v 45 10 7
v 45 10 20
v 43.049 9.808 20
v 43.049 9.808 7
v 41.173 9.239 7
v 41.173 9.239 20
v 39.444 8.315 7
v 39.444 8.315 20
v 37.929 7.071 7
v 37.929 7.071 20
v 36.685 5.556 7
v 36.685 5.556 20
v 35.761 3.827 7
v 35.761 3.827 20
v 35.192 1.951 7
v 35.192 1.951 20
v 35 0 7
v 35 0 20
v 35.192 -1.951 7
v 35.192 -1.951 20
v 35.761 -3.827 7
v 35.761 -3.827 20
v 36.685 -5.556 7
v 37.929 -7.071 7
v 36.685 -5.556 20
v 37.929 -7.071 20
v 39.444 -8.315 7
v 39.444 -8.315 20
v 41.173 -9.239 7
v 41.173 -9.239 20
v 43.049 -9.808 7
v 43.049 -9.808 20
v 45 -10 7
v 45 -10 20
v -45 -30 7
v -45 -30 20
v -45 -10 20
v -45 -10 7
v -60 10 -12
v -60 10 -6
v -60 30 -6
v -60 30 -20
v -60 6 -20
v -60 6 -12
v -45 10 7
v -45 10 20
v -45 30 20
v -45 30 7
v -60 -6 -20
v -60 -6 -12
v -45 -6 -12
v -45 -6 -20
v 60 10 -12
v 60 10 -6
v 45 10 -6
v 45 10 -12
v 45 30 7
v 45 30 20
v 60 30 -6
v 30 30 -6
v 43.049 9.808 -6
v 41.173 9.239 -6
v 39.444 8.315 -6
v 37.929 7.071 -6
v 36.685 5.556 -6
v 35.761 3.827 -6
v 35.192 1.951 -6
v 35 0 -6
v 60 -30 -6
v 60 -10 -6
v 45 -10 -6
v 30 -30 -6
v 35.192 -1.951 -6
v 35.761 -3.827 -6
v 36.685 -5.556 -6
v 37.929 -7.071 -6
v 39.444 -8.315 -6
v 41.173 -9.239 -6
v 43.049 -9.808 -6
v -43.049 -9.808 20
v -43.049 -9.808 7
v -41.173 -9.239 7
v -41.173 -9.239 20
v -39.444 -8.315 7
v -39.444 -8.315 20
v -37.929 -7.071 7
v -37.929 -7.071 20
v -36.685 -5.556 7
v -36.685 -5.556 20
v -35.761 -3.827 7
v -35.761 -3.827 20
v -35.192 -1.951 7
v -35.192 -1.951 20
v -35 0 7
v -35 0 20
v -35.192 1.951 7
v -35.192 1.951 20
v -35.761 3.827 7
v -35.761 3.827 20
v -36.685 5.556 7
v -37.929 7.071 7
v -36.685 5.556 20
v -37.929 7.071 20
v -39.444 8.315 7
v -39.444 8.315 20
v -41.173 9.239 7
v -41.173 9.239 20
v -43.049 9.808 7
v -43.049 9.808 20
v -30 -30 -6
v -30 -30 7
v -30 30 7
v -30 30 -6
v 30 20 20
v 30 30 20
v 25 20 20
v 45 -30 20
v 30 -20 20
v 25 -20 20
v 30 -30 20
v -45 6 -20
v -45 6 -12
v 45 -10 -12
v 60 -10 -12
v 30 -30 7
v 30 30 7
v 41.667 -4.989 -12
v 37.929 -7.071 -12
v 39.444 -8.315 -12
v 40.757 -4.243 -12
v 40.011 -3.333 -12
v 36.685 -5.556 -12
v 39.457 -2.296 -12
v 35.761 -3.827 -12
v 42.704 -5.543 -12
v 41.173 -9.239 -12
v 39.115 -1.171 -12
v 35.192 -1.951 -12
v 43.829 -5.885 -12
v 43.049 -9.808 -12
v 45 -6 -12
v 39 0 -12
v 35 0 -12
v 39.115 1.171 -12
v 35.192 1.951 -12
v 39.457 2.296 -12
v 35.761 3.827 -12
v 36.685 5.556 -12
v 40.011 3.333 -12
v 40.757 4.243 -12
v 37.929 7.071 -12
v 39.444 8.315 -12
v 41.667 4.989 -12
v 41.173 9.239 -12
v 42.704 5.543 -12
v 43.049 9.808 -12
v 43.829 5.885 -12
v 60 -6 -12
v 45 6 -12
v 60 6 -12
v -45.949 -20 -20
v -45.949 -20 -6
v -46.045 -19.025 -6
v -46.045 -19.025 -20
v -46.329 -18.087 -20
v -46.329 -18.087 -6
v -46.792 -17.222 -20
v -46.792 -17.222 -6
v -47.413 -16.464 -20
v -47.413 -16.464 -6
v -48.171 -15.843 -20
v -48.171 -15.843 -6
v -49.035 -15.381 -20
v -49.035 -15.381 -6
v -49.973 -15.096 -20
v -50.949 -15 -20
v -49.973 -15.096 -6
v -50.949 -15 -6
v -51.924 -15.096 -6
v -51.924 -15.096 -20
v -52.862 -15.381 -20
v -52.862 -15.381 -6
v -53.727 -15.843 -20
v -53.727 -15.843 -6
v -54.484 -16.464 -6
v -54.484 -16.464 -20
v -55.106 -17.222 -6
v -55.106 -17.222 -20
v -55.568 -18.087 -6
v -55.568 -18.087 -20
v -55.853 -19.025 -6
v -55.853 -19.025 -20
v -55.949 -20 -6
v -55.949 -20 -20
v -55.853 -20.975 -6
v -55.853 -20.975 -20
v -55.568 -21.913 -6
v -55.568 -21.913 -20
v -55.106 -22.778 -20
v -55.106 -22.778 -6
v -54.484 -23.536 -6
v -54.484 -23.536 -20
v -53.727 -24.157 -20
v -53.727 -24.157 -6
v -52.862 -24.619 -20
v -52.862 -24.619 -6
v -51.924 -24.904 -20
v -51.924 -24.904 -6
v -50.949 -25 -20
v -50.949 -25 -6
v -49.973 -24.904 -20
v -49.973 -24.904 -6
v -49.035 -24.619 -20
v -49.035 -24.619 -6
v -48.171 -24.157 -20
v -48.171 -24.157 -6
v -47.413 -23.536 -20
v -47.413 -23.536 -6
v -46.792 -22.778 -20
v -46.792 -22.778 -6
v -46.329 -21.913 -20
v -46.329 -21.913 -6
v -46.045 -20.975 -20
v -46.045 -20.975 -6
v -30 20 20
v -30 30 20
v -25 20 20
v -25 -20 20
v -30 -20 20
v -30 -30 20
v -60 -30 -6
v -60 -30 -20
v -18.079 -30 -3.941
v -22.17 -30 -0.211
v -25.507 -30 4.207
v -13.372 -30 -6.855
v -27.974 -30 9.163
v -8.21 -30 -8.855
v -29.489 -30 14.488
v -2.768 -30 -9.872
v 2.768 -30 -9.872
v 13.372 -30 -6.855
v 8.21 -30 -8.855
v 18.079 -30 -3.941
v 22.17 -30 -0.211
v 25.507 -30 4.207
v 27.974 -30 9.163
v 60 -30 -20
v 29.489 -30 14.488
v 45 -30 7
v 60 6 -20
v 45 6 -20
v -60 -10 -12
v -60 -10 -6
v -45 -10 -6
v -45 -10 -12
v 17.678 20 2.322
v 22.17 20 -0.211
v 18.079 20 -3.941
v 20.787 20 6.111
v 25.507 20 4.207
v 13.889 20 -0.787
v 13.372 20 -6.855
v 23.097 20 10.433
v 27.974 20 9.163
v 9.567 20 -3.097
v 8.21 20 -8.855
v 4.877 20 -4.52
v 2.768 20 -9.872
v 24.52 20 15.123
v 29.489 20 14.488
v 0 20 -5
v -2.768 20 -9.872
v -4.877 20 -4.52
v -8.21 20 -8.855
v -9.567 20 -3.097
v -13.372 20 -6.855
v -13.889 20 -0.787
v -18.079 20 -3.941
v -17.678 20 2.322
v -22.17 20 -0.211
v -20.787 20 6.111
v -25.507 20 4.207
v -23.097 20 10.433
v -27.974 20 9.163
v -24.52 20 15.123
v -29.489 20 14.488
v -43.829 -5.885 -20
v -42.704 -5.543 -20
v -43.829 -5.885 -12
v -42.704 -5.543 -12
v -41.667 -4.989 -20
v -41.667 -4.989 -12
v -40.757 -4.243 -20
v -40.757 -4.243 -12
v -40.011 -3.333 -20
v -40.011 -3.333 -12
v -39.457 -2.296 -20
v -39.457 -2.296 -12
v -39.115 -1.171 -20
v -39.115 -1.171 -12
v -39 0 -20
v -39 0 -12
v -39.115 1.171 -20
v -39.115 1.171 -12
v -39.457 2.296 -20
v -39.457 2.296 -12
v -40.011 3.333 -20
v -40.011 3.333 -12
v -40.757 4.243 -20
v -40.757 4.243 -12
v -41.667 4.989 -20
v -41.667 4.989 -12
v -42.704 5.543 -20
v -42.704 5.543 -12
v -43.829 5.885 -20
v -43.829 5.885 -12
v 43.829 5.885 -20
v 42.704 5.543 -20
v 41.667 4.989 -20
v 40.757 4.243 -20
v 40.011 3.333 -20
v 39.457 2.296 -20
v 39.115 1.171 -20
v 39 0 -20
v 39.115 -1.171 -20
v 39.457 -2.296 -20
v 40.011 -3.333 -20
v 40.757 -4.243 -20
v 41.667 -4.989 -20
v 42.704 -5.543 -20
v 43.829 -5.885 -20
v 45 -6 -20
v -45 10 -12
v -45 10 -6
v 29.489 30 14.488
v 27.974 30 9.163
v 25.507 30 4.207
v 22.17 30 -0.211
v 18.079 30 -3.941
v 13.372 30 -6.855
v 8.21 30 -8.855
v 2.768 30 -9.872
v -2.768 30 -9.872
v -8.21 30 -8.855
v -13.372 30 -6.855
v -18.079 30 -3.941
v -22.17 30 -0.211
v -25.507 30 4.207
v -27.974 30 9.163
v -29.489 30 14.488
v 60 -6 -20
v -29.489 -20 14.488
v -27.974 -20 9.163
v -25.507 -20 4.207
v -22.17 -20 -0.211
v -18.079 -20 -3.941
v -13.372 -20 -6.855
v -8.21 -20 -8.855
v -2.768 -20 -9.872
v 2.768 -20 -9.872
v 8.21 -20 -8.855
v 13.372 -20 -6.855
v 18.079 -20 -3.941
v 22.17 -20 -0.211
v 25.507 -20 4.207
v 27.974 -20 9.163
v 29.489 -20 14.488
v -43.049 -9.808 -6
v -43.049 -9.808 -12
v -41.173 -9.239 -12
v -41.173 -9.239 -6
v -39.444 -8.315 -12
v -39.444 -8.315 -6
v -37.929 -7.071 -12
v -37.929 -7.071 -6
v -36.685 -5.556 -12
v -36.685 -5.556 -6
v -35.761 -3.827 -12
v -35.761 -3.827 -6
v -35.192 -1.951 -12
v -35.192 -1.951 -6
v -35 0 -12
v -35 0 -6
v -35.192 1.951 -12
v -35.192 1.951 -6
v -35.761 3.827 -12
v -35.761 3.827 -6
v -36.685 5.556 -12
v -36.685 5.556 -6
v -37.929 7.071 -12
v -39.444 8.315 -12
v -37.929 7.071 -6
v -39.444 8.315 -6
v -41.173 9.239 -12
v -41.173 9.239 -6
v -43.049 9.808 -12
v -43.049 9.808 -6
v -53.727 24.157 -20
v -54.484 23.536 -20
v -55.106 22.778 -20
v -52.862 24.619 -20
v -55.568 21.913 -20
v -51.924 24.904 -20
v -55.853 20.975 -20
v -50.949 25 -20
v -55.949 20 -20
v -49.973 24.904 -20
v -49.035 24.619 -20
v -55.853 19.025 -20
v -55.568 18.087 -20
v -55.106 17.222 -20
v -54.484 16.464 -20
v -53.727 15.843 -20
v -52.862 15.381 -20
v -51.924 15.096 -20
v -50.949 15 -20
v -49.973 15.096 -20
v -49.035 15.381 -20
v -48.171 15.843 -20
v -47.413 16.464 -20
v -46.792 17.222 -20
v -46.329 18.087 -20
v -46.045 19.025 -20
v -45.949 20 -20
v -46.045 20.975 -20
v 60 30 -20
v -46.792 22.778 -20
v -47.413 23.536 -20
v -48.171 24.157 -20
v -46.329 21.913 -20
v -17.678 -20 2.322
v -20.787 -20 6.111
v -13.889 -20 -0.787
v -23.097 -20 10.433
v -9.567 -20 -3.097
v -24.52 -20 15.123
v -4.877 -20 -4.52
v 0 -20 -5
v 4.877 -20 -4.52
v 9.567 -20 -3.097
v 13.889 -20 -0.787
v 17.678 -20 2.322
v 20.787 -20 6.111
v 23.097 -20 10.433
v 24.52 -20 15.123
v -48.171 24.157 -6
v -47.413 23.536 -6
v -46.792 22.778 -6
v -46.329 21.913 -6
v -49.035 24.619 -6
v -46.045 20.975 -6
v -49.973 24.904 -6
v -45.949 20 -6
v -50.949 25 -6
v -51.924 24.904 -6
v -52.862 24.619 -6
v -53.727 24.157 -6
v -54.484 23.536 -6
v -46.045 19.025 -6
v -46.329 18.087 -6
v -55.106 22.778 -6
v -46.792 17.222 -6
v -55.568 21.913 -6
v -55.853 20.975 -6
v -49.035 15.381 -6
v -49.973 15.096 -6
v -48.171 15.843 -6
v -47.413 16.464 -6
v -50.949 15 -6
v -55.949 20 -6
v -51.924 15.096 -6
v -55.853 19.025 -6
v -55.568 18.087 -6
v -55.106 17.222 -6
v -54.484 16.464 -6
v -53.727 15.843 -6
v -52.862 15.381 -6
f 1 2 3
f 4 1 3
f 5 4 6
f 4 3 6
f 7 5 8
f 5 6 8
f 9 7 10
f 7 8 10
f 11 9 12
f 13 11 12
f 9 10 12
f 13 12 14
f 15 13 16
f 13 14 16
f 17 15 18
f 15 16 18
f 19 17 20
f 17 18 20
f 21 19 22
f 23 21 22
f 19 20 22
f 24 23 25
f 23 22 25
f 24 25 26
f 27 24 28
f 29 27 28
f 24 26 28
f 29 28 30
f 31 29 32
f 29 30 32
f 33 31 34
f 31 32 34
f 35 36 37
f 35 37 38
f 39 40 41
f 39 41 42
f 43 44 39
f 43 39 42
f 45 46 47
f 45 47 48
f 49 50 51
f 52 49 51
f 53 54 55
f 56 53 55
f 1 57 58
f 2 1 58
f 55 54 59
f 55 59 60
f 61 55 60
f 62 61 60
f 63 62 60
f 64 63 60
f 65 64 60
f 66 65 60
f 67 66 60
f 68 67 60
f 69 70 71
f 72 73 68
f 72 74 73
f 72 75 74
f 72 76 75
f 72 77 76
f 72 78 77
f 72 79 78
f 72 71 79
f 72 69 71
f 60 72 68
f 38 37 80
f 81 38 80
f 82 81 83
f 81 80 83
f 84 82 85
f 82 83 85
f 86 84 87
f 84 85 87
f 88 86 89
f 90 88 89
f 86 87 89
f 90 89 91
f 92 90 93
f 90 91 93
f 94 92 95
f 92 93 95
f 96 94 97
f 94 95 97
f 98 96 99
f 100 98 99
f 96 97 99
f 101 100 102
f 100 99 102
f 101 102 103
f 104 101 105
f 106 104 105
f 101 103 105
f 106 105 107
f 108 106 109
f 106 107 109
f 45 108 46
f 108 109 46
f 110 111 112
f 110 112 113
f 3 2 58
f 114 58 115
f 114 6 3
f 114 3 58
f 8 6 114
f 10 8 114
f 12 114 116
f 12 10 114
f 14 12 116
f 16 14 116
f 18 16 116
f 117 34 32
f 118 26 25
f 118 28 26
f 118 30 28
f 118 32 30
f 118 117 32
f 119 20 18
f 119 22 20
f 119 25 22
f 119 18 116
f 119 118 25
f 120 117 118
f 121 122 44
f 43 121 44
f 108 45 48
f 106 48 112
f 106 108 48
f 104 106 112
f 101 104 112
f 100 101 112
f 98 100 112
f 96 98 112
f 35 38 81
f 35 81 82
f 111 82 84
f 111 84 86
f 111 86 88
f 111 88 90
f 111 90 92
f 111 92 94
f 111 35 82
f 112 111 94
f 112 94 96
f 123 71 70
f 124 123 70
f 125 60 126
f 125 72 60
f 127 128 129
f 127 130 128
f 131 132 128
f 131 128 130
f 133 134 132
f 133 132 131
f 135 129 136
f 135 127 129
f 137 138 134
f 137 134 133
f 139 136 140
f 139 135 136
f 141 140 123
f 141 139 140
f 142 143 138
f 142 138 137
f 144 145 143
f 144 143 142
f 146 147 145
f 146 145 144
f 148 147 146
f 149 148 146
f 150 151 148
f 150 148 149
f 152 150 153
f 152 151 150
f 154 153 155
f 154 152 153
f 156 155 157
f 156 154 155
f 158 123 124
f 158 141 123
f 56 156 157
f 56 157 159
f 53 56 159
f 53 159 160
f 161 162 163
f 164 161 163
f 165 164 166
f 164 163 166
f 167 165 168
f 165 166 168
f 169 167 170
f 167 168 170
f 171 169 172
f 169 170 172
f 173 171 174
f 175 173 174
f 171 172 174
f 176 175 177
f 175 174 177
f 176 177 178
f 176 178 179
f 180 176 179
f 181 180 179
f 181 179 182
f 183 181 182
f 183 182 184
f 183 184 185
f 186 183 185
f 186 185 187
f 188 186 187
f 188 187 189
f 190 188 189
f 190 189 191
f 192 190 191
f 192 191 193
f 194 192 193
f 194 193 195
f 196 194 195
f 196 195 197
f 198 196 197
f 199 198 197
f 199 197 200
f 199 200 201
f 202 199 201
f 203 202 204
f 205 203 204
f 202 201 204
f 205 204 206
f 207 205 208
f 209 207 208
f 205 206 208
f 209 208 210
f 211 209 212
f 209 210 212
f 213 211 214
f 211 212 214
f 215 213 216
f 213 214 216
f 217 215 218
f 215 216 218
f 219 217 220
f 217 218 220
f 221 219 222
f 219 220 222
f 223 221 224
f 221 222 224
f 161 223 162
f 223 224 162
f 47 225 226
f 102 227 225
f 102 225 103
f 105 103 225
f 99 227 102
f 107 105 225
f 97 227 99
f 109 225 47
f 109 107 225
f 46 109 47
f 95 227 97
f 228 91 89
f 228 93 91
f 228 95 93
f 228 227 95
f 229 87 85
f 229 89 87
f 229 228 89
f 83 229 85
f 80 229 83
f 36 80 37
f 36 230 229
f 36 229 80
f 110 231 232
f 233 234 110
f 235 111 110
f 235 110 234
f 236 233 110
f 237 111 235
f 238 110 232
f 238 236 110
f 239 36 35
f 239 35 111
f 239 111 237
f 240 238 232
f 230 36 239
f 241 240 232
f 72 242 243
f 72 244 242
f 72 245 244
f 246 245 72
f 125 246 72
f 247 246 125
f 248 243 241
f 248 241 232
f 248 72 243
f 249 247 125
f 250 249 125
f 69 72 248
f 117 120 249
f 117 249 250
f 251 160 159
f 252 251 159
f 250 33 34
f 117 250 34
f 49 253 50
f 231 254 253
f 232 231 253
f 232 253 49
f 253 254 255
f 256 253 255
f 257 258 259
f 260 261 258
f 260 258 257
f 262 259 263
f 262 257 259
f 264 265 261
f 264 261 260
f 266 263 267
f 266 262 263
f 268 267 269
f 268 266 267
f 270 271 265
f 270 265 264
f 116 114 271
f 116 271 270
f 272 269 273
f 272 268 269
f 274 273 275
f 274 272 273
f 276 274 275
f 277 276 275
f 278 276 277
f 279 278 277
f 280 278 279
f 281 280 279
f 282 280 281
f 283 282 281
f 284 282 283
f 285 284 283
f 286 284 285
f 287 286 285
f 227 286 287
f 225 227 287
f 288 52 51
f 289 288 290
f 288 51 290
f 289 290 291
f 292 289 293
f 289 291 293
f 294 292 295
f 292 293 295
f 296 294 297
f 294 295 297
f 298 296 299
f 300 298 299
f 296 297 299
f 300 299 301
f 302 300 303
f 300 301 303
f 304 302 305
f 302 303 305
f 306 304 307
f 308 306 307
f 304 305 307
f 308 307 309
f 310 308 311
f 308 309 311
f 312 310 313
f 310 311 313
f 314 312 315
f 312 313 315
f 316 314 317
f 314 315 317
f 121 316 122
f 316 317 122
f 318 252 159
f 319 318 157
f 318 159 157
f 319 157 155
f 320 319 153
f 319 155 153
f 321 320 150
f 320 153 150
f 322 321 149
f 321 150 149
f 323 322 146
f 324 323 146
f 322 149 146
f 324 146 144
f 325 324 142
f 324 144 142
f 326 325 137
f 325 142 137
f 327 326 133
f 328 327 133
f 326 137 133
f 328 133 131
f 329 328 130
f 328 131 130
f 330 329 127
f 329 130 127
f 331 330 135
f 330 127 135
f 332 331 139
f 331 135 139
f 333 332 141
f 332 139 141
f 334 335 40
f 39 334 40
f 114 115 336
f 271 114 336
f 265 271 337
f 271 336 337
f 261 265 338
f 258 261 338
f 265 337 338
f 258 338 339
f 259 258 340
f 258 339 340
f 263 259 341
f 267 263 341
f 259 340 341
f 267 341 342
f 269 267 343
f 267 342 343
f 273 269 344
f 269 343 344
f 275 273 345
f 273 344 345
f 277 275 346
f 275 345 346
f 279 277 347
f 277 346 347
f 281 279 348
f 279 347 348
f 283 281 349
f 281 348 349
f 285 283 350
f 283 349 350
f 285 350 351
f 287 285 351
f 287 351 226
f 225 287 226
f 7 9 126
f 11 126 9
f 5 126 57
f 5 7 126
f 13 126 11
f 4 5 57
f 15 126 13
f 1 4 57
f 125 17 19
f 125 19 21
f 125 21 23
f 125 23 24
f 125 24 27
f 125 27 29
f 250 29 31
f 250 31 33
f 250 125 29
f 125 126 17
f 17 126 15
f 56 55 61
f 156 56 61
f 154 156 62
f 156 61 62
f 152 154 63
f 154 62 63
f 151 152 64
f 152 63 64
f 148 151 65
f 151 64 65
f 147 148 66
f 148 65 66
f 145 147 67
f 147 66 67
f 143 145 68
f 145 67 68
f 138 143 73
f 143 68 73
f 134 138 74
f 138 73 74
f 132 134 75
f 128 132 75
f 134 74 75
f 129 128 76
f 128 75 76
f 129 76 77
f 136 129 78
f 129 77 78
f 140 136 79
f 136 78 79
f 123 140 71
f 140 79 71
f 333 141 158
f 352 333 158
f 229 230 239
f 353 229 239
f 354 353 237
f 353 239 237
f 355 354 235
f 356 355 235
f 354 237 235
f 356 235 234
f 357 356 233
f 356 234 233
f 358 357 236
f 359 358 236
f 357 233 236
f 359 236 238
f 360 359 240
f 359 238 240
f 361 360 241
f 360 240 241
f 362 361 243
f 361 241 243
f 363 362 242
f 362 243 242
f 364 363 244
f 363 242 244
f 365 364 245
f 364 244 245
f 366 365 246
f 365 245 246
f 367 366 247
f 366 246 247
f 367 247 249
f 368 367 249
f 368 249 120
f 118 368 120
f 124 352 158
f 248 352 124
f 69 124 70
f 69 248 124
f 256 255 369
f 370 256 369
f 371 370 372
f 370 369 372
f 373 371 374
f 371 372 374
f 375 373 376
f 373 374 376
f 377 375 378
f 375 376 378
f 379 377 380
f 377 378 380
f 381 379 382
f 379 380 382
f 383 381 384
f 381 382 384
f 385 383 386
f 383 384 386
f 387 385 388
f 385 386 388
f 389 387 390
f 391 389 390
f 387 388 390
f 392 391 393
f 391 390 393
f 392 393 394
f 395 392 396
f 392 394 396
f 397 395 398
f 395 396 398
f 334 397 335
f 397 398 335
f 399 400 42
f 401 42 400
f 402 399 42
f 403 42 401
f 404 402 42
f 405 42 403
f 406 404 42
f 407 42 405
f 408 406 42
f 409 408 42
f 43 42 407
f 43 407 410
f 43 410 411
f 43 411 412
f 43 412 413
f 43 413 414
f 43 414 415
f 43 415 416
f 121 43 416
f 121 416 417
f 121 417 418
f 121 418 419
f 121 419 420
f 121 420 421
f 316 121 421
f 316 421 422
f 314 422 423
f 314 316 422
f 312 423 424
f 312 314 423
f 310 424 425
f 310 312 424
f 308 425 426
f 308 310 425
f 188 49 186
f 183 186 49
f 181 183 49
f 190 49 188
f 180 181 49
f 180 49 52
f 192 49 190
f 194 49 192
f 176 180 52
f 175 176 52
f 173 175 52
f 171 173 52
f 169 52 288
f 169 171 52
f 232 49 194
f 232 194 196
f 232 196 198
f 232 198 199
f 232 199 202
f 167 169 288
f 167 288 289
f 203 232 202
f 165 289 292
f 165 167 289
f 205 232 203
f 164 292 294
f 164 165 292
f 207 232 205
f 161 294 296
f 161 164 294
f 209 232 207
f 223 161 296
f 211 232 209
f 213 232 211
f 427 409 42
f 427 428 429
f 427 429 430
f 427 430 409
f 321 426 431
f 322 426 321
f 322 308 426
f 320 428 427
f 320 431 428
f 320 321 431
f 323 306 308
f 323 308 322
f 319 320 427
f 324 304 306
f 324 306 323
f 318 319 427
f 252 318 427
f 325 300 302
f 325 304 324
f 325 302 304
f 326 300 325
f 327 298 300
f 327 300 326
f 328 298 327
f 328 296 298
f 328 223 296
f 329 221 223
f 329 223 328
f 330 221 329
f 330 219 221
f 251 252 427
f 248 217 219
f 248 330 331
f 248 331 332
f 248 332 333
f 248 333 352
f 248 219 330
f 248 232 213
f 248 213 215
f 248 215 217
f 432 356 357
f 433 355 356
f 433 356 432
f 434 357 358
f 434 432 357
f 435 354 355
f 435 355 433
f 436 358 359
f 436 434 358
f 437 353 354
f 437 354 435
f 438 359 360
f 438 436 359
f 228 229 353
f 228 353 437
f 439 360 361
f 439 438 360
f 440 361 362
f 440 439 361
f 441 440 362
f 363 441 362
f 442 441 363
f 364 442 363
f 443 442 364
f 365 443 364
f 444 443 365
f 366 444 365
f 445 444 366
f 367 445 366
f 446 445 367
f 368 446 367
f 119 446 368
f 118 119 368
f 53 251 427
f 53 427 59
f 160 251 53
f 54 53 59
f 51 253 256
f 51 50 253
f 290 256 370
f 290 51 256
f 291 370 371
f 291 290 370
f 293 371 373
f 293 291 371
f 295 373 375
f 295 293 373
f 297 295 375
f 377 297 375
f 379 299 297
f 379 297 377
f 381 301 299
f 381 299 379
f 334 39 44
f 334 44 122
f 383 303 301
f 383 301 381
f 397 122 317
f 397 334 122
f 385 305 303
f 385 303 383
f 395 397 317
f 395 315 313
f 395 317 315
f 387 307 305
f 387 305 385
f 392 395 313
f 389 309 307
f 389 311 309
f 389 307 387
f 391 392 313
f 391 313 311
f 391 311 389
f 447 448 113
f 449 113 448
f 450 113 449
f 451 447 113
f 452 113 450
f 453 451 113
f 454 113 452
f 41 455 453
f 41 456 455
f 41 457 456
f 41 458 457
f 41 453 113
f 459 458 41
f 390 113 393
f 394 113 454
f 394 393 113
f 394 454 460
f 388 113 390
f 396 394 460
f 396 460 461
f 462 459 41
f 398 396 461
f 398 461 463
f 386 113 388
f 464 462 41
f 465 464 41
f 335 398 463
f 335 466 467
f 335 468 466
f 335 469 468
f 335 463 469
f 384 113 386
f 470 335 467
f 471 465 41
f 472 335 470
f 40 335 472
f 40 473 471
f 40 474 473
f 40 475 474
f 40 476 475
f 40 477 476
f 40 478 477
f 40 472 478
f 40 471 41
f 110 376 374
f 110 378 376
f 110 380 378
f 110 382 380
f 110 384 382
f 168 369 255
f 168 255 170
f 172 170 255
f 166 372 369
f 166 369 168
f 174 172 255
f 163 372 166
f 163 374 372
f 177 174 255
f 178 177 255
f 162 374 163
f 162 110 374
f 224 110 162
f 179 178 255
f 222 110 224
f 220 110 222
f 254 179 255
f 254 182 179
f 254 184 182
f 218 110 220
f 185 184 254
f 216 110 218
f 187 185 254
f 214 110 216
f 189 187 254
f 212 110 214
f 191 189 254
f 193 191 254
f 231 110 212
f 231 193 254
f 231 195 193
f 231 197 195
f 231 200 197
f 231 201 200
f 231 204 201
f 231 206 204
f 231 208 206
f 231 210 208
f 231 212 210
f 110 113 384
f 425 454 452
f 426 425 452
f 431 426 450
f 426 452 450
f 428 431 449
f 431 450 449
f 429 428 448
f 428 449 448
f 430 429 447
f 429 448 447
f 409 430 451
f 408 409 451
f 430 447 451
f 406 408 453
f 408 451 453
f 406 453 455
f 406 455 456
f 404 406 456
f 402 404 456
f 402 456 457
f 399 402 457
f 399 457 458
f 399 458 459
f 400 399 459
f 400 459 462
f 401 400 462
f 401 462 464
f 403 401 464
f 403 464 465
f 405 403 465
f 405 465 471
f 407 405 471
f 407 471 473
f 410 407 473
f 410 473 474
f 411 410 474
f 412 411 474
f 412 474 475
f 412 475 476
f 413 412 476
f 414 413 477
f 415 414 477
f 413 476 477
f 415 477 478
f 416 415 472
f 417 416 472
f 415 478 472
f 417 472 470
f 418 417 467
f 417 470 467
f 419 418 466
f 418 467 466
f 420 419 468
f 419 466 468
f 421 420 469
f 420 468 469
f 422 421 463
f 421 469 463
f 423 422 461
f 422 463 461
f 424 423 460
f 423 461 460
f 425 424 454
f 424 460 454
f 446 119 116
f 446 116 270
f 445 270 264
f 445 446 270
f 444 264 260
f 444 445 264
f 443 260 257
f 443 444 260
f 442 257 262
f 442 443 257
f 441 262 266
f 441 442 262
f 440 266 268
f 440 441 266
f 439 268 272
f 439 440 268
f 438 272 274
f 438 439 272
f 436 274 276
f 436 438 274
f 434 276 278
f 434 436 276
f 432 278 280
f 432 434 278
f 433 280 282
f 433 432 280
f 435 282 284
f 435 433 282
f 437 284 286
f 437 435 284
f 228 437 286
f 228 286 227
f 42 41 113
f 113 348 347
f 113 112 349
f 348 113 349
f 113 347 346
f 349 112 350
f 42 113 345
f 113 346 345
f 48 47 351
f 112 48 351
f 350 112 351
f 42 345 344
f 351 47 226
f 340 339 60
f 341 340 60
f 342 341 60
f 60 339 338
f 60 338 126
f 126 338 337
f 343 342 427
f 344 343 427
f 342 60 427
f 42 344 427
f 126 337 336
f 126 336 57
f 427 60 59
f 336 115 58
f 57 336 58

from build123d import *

# Parameters (mm, degrees)
F1_DEPTH      = 30
F1_DEPTH_BACK = 30
F3_DEPTH      = 10
F5_DEPTH      = 10
F7_DEPTH      = 32
F9_DEPTH      = 14
F10_R         = 5
F11_DEPTH     = 15


with BuildPart() as f1:
    # F0 (on Front) → F1 (new body, two sides)
    with BuildSketch(Plane.XZ) as f1_sk:
        with BuildLine():
            Line((45, 7), (45, 20))
            Line((45, 20), (25, 20))
            ThreePointArc((25, 20), (0, -5), (-25, 20))
            Line((-25, 20), (-45, 20))
            Line((-45, 20), (-45, 7))
            Line((-45, 7), (-30, 7))
            Line((-30, 7), (-30, -6))
            Line((-30, -6), (-60, -6))
            Line((-60, -6), (-60, -20))
            Line((-60, -20), (60, -20))
            Line((60, -20), (60, -6))
            Line((60, -6), (30, -6))
            Line((30, -6), (30, 7))
            Line((30, 7), (45, 7))
        make_face()
    extrude(amount=F1_DEPTH)
    extrude(f1_sk.sketch, amount=-F1_DEPTH_BACK)

    # F2 (on face) → F3 (cut)
    with BuildSketch(Plane(origin=(0, 30, 0), x_dir=(-1, 0, 0), z_dir=(0, 1, 0))):
        with BuildLine():
            Line((-25, 20), (-30, 20))
            ThreePointArc((-30, 20), (0, -10), (30, 20))
            Line((30, 20), (25, 20))
            ThreePointArc((25, 20), (0, -5), (-25, 20))
        make_face()
    extrude(amount=-F3_DEPTH, mode=Mode.SUBTRACT)

    # F4 (on face) → F5 (cut)
    with BuildSketch(Plane.XZ.offset(30)):
        with BuildLine():
            Line((30, 20), (-30, 20))
            ThreePointArc((-30, 20), (0, -10), (30, 20))
        make_face()
    extrude(amount=-F5_DEPTH, mode=Mode.SUBTRACT)

    # F6 (on face) → F7 (cut)
    with BuildSketch(Plane.XY.offset(20)):
        with BuildLine():
            Line((-45, 10), (-78.402293, 10))
            Line((-78.402293, 10), (-78.402293, -10))
            Line((-78.402293, -10), (-45, -10))
            ThreePointArc((-45, -10), (-35, 0), (-45, 10))
        make_face()
        with BuildLine():
            ThreePointArc((45, 10), (35, 0), (45, -10))
            Line((45, -10), (78.402293, -10))
            Line((78.402293, -10), (78.402293, 10))
            Line((78.402293, 10), (45, 10))
        make_face()
    extrude(amount=-F7_DEPTH, mode=Mode.SUBTRACT)

    # F8 (on face) → F9 (cut)
    with BuildSketch(Plane.XY.offset(-6)):
        with BuildLine():
            Line((-45, 6), (-64, 6))
            Line((-64, 6), (-64, -6))
            Line((-64, -6), (-45, -6))
            ThreePointArc((-45, -6), (-39, 0), (-45, 6))
        make_face()
        with BuildLine():
            ThreePointArc((45, 6), (39, 0), (45, -6))
            Line((45, -6), (64, -6))
            Line((64, -6), (64, 6))
            Line((64, 6), (45, 6))
        make_face()
    extrude(amount=-F9_DEPTH, mode=Mode.SUBTRACT)

    # F10 (on face) → F11 (cut)
    with BuildSketch(Plane.XY.offset(-6)):
        with Locations((-50.948888, 20)):
            Circle(F10_R)
        with Locations((-50.948888, -20)):
            Circle(F10_R)
    extrude(amount=-F11_DEPTH, mode=Mode.SUBTRACT)


solid = f1.part
